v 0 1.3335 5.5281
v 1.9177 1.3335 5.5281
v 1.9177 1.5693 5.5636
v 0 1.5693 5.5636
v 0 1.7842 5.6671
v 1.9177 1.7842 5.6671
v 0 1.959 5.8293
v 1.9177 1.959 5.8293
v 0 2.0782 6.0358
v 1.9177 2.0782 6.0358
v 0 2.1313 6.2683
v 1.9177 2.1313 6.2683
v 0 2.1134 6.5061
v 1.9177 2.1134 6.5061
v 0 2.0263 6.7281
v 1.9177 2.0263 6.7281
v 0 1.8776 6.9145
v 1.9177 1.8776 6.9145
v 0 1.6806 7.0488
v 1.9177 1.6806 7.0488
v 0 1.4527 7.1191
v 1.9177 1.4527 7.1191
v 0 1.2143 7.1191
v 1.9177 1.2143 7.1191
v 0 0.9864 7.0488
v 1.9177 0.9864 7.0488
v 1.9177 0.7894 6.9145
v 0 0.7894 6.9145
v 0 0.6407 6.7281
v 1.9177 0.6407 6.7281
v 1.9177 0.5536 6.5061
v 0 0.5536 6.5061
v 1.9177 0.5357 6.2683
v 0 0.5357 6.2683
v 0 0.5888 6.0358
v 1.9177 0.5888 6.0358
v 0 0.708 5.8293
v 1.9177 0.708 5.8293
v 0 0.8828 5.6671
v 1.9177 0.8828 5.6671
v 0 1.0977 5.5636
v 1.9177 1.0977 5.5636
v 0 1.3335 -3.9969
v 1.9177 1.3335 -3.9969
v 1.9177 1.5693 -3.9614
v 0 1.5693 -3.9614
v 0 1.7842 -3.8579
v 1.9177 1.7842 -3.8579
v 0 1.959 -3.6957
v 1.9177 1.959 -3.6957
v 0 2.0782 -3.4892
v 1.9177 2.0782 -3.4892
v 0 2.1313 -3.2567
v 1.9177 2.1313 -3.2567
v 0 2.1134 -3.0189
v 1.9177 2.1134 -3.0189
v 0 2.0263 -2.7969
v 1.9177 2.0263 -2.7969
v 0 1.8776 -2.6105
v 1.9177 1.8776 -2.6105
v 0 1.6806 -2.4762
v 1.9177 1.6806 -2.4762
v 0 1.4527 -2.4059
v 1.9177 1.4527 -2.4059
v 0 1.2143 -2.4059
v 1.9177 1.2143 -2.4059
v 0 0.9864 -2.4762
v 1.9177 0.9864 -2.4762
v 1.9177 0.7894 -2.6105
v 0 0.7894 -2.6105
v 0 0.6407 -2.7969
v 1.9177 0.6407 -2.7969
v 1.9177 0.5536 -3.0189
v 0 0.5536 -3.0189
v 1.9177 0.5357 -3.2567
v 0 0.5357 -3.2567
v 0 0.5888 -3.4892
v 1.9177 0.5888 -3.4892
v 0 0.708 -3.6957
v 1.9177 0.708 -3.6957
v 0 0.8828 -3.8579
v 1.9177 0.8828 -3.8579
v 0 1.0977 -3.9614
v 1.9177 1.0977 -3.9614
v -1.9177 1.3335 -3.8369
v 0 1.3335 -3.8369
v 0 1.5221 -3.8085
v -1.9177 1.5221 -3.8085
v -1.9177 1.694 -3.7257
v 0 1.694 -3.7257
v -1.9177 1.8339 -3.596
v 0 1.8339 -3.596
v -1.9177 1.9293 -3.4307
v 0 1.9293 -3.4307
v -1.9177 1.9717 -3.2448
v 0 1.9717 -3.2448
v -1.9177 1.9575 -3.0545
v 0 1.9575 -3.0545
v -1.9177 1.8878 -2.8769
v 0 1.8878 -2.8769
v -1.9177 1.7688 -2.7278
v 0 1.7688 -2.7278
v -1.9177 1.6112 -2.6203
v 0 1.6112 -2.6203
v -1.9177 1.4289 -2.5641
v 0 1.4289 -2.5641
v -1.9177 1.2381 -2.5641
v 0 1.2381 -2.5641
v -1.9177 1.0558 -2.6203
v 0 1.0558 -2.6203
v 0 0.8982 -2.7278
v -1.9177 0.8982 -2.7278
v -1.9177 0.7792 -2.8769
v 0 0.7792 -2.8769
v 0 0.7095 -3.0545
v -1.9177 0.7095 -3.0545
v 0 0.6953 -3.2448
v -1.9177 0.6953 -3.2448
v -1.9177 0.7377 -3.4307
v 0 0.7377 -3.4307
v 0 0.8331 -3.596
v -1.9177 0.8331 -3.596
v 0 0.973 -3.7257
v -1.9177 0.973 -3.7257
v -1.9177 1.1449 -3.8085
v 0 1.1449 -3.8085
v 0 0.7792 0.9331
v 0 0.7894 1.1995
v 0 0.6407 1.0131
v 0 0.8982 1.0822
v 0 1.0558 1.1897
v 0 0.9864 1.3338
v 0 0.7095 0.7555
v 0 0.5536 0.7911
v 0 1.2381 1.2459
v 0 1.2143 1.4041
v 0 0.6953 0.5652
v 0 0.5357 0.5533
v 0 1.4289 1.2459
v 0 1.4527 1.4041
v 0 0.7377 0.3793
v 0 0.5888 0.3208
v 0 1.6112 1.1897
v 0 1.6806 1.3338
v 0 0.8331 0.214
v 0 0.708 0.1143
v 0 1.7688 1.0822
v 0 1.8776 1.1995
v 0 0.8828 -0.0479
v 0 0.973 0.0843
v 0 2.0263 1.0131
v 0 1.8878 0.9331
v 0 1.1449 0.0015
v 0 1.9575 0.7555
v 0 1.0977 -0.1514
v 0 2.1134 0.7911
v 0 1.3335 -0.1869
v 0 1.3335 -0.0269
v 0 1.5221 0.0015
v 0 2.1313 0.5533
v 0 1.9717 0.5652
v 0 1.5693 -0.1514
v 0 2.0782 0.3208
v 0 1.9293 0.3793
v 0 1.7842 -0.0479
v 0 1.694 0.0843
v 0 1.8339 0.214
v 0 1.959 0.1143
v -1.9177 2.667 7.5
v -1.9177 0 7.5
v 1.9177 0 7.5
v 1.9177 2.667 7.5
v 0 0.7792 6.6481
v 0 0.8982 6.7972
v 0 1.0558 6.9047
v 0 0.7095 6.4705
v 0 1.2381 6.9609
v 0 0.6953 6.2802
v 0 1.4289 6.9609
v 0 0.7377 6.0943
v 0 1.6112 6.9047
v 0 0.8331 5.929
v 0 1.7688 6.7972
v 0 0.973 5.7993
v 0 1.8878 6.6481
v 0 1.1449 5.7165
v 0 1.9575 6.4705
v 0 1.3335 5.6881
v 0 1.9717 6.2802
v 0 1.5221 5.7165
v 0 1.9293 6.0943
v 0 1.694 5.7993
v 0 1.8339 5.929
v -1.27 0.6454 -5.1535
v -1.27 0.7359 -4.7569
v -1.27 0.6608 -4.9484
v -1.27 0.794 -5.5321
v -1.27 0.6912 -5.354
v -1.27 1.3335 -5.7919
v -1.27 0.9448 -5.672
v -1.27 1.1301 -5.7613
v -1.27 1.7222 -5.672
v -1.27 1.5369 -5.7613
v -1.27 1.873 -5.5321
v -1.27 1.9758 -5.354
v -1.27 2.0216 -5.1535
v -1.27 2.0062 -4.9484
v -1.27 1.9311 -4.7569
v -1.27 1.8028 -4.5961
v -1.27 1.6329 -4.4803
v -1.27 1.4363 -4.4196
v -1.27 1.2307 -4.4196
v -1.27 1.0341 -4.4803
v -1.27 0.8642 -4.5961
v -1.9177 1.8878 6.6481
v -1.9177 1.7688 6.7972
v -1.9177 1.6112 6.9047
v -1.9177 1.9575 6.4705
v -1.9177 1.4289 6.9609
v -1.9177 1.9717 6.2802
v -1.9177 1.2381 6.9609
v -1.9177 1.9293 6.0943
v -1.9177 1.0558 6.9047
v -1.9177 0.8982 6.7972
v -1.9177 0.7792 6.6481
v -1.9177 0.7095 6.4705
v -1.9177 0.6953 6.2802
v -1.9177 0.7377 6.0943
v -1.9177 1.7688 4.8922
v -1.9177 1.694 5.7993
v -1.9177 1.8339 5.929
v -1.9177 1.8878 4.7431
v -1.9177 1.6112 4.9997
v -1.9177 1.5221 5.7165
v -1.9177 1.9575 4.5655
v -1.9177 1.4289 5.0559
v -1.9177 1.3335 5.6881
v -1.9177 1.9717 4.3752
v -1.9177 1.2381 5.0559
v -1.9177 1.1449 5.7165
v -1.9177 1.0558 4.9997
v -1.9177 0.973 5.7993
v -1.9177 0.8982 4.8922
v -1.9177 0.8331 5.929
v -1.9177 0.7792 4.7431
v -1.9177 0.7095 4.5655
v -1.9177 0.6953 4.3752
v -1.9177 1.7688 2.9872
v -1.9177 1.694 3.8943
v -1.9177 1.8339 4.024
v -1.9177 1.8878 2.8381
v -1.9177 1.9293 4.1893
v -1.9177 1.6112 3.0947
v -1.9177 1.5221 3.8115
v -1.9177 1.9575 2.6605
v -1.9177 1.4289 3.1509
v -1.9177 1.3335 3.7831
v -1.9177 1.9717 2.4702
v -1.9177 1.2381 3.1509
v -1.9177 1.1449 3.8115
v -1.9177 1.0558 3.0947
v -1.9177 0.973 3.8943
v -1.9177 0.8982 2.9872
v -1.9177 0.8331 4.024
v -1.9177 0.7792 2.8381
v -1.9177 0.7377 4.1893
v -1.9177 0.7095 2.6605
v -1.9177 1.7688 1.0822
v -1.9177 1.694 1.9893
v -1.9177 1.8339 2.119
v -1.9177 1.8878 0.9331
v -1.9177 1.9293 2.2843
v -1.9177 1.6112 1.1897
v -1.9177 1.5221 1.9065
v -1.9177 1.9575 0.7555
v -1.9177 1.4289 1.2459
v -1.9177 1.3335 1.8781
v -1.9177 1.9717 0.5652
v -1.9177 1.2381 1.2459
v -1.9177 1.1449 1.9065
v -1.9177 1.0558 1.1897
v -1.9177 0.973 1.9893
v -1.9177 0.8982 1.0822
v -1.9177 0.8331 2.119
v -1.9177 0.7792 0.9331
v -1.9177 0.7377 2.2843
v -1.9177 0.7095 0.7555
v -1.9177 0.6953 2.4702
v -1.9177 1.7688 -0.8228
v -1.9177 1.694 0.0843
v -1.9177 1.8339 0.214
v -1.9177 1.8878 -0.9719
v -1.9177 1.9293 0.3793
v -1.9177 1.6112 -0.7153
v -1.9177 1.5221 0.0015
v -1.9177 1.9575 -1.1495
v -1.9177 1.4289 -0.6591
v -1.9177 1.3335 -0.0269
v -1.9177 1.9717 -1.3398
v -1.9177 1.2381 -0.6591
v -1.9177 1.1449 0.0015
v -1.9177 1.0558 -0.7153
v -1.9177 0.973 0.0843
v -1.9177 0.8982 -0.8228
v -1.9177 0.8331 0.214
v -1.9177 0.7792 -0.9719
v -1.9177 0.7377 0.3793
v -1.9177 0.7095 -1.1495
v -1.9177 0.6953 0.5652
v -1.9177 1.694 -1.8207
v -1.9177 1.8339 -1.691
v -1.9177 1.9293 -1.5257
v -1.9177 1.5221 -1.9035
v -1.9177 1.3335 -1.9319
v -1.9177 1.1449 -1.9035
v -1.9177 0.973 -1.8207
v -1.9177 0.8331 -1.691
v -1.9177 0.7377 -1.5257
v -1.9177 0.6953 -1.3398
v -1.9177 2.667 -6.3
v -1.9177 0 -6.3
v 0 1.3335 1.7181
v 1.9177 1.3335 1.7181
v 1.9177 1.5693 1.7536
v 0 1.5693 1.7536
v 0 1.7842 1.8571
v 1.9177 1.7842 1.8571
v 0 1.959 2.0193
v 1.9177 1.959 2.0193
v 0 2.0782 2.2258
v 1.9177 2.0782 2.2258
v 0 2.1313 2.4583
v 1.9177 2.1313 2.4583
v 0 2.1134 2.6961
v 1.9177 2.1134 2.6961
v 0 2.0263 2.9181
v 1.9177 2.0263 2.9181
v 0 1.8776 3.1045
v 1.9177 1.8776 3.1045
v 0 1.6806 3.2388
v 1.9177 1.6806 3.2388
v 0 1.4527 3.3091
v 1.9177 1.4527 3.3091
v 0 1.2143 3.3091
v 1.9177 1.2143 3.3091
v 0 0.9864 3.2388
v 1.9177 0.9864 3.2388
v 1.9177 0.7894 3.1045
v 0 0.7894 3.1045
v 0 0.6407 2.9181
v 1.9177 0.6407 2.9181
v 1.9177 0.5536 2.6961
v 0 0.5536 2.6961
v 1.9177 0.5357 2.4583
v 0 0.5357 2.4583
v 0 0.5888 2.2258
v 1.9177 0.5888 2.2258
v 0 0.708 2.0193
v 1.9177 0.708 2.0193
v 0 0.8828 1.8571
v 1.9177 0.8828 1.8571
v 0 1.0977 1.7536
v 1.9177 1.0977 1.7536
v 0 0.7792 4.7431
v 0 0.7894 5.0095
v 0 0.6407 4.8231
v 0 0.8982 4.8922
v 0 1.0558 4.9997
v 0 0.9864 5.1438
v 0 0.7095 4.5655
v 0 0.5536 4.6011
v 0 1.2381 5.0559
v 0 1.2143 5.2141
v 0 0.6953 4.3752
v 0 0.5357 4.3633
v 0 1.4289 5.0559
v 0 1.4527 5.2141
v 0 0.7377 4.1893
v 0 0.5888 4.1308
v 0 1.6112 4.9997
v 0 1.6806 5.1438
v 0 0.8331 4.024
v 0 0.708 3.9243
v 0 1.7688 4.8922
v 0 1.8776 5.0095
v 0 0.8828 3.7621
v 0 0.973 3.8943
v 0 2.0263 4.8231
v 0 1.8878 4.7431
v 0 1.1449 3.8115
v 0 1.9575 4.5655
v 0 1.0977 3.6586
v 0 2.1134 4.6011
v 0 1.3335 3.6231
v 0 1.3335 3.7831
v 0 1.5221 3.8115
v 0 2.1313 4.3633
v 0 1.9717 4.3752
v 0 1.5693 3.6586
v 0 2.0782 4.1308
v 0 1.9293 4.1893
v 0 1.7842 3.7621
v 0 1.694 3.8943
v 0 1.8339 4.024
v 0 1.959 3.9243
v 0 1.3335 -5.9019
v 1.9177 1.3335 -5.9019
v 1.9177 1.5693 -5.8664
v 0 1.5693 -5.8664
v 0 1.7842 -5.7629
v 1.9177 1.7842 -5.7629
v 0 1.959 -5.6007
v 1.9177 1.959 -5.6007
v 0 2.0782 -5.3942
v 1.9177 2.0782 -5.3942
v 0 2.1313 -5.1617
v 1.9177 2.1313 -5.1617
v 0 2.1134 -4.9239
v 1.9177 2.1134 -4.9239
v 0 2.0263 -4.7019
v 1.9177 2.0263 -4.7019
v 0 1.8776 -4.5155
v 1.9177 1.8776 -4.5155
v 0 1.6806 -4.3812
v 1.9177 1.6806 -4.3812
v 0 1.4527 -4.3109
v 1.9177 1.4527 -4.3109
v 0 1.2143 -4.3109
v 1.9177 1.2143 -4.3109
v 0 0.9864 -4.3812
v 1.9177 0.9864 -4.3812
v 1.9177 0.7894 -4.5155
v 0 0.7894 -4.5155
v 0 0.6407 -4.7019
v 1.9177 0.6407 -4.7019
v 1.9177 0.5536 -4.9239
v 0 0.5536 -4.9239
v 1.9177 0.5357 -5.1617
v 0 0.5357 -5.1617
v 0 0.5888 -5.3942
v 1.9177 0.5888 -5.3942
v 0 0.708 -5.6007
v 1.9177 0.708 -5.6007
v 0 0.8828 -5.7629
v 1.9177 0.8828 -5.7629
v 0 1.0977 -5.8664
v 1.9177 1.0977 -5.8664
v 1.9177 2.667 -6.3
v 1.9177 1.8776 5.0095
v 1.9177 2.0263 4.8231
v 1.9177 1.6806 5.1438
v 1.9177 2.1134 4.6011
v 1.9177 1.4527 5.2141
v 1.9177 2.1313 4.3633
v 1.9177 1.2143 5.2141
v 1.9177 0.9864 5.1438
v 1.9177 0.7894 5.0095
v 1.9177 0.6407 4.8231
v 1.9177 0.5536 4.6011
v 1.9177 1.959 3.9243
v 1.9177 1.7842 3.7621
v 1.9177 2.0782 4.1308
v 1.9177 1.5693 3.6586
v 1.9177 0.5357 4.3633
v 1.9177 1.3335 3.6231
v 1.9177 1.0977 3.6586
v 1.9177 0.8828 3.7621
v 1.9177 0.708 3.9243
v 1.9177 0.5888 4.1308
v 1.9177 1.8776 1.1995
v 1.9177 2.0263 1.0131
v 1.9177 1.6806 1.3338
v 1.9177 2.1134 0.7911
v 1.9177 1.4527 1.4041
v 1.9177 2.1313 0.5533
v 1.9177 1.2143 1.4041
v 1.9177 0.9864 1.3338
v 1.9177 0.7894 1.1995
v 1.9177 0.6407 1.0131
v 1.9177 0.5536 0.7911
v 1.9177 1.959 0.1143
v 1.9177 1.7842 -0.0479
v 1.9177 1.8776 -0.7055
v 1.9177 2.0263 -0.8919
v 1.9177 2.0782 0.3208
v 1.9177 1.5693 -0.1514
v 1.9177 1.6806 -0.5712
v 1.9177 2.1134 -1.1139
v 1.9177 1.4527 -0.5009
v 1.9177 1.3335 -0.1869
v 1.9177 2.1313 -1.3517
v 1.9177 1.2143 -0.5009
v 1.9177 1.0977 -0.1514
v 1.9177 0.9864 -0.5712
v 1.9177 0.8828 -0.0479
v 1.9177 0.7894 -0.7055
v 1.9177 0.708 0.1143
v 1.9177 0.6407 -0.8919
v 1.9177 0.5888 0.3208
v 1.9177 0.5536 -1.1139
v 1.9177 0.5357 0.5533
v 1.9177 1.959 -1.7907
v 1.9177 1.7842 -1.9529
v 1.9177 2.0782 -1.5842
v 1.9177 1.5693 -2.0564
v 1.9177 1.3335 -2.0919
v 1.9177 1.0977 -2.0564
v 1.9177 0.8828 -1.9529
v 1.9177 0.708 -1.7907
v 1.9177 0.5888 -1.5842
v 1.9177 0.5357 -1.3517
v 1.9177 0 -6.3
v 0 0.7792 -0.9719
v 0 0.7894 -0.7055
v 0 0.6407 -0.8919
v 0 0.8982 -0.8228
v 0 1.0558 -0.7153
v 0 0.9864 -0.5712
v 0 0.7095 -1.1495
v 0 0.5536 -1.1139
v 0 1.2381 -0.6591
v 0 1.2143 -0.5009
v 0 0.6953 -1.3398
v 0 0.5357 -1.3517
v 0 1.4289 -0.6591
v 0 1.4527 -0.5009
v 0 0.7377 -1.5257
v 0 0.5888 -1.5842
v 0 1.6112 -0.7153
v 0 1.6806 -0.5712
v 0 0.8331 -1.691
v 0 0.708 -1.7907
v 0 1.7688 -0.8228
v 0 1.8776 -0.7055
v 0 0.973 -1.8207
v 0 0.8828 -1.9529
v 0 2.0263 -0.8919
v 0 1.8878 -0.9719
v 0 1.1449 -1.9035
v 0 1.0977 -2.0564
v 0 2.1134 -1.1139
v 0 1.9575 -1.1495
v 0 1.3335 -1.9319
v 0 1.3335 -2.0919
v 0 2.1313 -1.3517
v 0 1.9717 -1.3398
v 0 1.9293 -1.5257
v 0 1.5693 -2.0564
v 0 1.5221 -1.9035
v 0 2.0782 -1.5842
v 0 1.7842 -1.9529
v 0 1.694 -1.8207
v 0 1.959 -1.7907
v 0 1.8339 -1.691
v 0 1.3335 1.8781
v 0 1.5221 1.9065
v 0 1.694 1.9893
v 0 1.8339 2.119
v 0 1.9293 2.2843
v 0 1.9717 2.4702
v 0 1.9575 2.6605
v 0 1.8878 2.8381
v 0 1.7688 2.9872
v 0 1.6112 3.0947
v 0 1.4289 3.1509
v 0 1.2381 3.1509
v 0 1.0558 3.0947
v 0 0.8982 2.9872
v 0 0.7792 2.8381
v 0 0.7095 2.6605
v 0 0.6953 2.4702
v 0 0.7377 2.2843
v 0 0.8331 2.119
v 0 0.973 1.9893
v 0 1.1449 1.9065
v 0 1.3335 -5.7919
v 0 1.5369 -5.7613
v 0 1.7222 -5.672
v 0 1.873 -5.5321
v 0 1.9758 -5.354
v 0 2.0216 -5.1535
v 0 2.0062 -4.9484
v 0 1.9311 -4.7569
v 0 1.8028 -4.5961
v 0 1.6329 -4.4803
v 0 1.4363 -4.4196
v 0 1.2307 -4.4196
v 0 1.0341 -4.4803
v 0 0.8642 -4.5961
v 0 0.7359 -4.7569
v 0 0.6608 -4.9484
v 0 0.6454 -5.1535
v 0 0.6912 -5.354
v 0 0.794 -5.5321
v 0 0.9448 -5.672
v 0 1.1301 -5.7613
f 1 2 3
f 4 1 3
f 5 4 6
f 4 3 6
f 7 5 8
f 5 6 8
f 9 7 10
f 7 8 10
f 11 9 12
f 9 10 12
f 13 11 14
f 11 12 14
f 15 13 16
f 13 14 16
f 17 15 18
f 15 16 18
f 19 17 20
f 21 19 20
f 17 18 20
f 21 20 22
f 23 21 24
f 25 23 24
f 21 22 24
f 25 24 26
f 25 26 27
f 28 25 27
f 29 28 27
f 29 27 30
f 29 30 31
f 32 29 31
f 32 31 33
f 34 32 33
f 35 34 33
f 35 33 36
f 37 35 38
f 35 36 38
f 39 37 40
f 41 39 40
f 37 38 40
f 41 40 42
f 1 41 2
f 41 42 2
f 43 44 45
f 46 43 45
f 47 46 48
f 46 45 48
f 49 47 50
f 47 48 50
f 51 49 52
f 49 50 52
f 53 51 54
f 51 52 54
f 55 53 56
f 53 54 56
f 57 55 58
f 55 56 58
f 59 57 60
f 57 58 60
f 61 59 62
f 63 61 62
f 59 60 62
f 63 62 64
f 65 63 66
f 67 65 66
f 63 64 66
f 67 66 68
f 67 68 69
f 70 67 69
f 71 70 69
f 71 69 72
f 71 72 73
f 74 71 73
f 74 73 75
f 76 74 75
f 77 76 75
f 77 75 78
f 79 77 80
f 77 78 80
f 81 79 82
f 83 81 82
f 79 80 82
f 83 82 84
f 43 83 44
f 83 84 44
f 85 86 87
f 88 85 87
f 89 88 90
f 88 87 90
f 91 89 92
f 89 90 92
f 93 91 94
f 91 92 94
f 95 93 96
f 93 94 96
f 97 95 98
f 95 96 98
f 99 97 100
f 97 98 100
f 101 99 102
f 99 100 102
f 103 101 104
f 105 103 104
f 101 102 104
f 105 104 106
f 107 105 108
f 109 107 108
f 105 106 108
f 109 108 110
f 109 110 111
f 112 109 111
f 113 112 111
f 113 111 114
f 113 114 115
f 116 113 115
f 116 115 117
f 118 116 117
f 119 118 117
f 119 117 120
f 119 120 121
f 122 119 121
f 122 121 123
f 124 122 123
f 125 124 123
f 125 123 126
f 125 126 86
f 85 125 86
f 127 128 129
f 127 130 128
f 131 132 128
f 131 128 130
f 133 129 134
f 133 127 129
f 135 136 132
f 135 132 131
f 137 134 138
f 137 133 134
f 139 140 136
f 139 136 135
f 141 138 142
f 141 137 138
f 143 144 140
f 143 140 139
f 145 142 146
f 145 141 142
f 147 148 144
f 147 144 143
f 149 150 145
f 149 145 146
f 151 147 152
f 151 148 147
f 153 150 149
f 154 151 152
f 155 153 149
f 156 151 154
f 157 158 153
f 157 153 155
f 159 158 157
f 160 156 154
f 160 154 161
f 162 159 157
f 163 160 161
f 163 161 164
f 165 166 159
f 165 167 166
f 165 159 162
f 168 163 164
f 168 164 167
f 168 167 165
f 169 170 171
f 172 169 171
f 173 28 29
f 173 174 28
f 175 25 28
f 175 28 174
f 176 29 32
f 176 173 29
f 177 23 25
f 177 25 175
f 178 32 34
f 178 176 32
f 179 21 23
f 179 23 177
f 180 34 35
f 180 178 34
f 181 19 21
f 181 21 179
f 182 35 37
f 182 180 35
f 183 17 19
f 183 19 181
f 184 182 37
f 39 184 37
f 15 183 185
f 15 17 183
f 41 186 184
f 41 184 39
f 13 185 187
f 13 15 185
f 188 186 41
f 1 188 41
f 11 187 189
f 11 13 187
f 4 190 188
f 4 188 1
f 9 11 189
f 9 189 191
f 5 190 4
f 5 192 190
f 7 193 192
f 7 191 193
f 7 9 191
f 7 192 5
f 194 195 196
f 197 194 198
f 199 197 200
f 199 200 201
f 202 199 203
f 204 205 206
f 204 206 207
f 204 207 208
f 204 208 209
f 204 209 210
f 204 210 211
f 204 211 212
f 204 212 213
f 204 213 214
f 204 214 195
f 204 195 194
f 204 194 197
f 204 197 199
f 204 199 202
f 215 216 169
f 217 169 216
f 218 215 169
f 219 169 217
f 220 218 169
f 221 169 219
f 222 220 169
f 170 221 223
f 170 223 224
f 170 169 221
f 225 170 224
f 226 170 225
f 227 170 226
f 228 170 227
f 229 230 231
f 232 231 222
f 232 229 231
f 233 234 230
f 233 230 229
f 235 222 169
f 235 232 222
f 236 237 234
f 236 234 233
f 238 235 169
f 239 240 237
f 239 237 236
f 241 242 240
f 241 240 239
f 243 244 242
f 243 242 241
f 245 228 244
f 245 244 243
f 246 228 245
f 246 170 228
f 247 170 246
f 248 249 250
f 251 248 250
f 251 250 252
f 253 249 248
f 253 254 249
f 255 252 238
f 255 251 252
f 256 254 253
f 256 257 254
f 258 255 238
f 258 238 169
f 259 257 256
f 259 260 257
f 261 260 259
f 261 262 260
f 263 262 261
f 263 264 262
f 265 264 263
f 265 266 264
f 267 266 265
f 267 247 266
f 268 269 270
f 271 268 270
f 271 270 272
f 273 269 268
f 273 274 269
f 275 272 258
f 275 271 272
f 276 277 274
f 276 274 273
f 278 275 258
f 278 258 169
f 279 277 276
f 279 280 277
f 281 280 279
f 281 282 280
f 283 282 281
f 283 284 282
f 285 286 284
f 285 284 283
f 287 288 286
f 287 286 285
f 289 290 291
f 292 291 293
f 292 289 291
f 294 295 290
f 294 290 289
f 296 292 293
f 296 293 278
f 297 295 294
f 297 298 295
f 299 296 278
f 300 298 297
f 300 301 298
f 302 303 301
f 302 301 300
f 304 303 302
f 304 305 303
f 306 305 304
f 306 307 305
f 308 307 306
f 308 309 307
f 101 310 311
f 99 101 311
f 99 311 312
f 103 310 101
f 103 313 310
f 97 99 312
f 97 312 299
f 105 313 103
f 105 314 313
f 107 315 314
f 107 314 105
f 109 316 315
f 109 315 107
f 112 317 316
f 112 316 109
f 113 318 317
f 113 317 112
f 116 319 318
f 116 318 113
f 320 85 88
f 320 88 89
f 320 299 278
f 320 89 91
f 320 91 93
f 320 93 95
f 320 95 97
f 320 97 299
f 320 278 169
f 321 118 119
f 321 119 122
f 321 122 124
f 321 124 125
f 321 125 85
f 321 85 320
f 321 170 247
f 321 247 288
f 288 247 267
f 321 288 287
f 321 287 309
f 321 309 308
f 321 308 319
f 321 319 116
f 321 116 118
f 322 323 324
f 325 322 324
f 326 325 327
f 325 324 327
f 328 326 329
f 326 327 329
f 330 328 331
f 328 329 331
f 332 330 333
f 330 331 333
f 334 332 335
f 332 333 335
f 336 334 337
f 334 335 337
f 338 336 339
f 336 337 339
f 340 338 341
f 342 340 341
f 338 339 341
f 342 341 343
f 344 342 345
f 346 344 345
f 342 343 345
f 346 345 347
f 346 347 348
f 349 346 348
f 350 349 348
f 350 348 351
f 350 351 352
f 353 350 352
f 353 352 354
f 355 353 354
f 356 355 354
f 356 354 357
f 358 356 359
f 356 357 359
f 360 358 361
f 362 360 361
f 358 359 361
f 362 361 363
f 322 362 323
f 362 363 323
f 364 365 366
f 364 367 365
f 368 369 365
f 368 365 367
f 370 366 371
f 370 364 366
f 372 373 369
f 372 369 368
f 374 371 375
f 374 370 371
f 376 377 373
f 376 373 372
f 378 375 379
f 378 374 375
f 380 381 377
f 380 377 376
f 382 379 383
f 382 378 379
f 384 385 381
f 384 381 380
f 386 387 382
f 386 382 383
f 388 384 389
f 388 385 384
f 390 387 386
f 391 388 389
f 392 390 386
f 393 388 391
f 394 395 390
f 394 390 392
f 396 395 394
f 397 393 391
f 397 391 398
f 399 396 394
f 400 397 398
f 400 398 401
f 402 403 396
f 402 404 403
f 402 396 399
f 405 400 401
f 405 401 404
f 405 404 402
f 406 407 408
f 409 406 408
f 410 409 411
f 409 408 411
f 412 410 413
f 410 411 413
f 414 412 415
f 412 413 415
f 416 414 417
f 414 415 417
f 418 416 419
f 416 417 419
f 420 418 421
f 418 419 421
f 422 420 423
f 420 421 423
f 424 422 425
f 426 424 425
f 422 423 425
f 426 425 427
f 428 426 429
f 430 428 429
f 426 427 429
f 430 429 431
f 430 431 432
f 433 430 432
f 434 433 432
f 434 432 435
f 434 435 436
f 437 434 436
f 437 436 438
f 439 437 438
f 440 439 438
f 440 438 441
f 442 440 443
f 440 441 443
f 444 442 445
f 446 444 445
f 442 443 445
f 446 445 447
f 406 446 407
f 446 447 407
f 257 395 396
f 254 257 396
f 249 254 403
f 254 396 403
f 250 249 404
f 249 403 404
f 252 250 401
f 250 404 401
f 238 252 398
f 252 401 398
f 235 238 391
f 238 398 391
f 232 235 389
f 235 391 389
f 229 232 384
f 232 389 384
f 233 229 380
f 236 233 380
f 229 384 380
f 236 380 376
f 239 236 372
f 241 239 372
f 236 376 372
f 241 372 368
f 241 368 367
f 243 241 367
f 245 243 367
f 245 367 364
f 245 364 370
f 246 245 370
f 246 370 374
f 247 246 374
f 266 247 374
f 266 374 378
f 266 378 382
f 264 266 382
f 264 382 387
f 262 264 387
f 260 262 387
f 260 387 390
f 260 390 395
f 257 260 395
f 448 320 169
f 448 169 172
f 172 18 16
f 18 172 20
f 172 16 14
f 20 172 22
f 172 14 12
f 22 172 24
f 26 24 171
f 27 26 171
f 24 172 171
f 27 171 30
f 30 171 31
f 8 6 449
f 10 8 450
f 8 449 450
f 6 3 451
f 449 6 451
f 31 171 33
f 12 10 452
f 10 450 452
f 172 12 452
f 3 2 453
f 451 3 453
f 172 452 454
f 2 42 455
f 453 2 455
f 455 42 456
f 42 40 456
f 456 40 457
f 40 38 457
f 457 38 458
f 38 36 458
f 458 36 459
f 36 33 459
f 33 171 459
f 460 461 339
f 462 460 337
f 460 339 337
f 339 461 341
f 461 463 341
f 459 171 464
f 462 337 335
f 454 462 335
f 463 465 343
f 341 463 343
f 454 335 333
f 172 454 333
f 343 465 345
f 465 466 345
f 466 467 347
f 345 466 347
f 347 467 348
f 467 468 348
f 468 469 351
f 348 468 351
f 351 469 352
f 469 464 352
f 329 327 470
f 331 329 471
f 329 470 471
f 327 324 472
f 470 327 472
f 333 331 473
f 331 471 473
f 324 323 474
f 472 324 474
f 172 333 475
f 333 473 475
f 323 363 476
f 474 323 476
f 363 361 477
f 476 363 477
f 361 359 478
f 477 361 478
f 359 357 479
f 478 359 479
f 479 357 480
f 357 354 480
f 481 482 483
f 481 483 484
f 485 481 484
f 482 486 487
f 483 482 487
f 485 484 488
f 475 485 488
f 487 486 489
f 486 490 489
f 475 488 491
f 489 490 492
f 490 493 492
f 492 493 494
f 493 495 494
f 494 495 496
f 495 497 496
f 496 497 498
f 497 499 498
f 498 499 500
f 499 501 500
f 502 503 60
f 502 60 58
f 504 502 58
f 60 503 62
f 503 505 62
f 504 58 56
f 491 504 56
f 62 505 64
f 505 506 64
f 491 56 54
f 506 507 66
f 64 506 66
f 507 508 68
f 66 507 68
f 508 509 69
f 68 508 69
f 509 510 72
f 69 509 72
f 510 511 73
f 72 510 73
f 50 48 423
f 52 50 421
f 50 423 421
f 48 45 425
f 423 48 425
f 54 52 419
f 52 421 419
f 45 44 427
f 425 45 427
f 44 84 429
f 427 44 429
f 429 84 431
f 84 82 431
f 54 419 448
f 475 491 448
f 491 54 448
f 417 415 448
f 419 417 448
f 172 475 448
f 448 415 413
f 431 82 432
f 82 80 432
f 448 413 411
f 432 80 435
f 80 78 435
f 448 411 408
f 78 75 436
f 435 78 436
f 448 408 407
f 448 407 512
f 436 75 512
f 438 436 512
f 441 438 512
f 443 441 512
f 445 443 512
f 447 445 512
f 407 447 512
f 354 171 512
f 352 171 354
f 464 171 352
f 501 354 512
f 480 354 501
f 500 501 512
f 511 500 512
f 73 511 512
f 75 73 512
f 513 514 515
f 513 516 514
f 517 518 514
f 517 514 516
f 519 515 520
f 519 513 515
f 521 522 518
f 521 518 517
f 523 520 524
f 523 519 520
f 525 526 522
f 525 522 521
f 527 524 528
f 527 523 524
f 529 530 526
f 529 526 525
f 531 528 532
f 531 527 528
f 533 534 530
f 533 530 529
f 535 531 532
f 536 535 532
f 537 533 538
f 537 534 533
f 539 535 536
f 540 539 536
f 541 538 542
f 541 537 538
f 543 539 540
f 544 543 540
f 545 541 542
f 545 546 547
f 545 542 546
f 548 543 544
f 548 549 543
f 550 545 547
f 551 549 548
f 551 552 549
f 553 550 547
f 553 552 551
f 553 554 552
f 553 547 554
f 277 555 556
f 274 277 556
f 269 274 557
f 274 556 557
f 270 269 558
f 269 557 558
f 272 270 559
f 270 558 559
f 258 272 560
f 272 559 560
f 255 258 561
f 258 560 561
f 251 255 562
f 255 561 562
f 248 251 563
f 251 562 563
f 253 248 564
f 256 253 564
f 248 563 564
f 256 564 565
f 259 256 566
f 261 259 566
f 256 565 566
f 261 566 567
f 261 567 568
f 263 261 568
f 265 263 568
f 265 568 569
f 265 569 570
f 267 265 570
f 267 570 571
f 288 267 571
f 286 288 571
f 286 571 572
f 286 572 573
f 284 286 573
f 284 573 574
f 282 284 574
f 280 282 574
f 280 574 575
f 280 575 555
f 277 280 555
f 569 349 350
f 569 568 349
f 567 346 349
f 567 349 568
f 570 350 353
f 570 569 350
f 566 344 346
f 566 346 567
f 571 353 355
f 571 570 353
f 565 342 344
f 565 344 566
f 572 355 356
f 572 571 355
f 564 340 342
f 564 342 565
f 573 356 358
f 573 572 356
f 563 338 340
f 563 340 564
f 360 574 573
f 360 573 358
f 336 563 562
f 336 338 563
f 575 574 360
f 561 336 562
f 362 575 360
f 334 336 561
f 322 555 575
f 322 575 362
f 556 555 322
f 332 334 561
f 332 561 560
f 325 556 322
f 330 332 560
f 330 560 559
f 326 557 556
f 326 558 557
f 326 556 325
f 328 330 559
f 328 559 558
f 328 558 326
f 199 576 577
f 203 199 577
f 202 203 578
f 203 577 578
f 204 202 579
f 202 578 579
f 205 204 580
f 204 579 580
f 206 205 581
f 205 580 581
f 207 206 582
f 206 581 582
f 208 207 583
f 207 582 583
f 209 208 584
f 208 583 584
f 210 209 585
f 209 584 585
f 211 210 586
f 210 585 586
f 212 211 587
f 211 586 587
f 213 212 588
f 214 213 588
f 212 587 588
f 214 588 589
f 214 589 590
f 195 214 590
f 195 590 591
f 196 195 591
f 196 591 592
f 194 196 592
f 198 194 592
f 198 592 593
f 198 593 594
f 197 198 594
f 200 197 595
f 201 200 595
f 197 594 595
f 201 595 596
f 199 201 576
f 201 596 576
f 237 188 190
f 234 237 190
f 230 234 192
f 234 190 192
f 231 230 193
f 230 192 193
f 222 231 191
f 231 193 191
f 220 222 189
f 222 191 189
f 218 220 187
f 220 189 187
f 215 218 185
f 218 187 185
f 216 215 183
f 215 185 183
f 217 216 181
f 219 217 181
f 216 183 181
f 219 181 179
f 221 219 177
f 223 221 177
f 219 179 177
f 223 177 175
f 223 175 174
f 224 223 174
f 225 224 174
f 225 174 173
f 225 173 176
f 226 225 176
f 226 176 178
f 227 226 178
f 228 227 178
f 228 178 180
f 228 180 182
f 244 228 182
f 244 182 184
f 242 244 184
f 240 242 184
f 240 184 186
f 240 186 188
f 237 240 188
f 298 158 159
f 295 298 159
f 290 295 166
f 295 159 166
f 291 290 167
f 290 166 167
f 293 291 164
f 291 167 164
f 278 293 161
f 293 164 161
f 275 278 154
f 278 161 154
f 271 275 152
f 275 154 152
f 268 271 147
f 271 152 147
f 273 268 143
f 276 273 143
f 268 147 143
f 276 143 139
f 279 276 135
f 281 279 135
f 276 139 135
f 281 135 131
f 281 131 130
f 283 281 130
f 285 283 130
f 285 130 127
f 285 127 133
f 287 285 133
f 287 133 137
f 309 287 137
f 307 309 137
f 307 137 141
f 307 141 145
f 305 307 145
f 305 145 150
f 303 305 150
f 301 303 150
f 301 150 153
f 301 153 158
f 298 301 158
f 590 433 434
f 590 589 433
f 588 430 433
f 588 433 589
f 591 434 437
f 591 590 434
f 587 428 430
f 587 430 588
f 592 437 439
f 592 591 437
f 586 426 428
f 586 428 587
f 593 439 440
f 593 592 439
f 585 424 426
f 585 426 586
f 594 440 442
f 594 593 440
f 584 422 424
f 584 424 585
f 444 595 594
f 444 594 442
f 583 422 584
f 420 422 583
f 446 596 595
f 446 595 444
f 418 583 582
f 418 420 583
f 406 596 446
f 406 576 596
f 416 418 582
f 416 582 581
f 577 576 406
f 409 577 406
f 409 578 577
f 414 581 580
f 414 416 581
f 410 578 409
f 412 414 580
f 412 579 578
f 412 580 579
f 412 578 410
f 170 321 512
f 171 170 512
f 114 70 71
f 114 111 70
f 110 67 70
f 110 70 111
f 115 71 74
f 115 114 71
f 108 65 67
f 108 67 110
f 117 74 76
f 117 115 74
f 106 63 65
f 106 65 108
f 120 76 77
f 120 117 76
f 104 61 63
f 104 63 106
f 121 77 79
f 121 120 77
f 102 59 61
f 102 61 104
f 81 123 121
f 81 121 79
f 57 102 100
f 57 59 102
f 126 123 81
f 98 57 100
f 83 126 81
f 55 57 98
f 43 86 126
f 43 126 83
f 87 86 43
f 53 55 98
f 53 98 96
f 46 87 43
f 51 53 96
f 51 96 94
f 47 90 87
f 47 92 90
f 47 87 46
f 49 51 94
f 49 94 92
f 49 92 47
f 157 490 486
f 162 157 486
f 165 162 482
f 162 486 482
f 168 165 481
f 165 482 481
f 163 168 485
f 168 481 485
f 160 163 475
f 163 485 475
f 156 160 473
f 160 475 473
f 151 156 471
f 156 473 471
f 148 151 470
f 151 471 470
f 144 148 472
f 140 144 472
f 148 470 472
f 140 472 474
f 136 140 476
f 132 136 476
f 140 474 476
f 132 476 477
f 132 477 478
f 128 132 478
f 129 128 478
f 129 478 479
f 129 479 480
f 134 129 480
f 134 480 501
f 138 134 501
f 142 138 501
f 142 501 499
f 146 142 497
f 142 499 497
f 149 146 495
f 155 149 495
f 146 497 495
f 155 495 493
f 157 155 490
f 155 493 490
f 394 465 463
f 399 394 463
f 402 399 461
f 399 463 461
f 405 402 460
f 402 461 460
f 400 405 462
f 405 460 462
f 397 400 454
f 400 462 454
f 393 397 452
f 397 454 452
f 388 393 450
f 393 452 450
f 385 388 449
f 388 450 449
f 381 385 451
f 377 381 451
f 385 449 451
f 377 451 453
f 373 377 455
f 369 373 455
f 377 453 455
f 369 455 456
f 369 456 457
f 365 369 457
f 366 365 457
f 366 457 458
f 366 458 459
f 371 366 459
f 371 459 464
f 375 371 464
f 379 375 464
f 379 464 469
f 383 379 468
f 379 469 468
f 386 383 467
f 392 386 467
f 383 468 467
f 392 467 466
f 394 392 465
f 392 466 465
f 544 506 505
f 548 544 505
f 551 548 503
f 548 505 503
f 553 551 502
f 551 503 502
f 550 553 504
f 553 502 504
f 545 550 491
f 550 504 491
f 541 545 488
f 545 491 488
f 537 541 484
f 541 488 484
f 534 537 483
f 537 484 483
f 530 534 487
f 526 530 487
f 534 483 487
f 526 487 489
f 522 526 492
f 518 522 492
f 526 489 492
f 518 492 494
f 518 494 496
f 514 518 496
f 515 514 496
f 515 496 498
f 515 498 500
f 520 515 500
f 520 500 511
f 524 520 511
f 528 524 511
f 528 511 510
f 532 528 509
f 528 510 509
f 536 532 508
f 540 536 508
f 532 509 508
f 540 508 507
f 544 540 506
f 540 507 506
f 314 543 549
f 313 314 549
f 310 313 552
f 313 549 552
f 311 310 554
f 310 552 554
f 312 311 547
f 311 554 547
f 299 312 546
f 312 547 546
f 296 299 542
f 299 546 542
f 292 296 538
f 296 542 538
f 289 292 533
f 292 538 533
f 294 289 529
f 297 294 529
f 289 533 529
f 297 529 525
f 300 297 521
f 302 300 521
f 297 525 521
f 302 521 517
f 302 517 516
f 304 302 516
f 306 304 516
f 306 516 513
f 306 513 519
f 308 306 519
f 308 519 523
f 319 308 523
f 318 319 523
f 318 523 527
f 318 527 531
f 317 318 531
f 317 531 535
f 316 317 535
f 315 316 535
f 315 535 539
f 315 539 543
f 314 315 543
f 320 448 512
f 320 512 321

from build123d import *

# Parameters (mm, degrees)
SKETCH1_W           = 3.8354
SKETCH1_H           = 15
BOSS_EXTRUDE1_DEPTH = 2.667
SKETCH4_R           = 0.8
CUT_EXTRUDE1_DEPTH  = 1.9177
SKETCH5_R           = 0.64
CUT_EXTRUDE2_DEPTH  = 2.9177
SKETCH6_R           = 0.69
CUT_EXTRUDE3_DEPTH  = 1.27
SKETCH9_W           = 3.8354
SKETCH9_H           = 2.667
CUT_EXTRUDE5_DEPTH  = 1.2


with BuildPart() as part:
    # Sketch1 → Boss-Extrude1 (new body)
    with BuildSketch(Plane(origin=(0, 0, 0), x_dir=(1, 0, 0), z_dir=(0, 1, 0))):
        Rectangle(SKETCH1_W, SKETCH1_H)
    extrude(amount=BOSS_EXTRUDE1_DEPTH)

    # Sketch4 → Cut-Extrude1 (cut)
    with BuildSketch(Plane(origin=(1.9177, 0, 0), x_dir=(0, 0, -1), z_dir=(1, 0, 0))):
        with Locations((-6.328069737, 1.3335)):
            Circle(SKETCH4_R)
        with Locations((-4.423069737, 1.3335)):
            Circle(SKETCH4_R)
        with Locations((-2.518069737, 1.3335)):
            Circle(SKETCH4_R)
        with Locations((-0.613069737, 1.3335)):
            Circle(SKETCH4_R)
        with Locations((1.291930263, 1.3335)):
            Circle(SKETCH4_R)
        with Locations((3.196930263, 1.3335)):
            Circle(SKETCH4_R)
        with Locations((5.101930263, 1.3335)):
            Circle(SKETCH4_R)
    extrude(amount=-CUT_EXTRUDE1_DEPTH, mode=Mode.SUBTRACT)

    # Sketch5 → Cut-Extrude2 (cut, through all)
    with BuildSketch(Plane(origin=(0, 0, 0), x_dir=(0, 0, -1), z_dir=(1, 0, 0))):
        with Locations((-6.328069737, 1.3335)):
            Circle(SKETCH5_R)
        with Locations((-4.423069737, 1.3335)):
            Circle(SKETCH5_R)
        with Locations((-2.518069737, 1.3335)):
            Circle(SKETCH5_R)
        with Locations((-0.613069737, 1.3335)):
            Circle(SKETCH5_R)
        with Locations((1.291930263, 1.3335)):
            Circle(SKETCH5_R)
        with Locations((3.196930263, 1.3335)):
            Circle(SKETCH5_R)
    extrude(amount=-CUT_EXTRUDE2_DEPTH, mode=Mode.SUBTRACT)

    # Sketch6 → Cut-Extrude3 (cut)
    with BuildSketch(Plane(origin=(0, 0, 0), x_dir=(0, 0, -1), z_dir=(1, 0, 0))):
        with Locations((5.101930263, 1.3335)):
            Circle(SKETCH6_R)
    extrude(amount=-CUT_EXTRUDE3_DEPTH, mode=Mode.SUBTRACT)

    # Sketch9 → Cut-Extrude5 (cut)
    with BuildSketch(Plane(origin=(0, 0, -7.5), x_dir=(-1, 0, 0), z_dir=(0, 0, -1))):
        with Locations((0, 1.3335)):
            Rectangle(SKETCH9_W, SKETCH9_H)
    extrude(amount=-CUT_EXTRUDE5_DEPTH, mode=Mode.SUBTRACT)


solid = part.part
